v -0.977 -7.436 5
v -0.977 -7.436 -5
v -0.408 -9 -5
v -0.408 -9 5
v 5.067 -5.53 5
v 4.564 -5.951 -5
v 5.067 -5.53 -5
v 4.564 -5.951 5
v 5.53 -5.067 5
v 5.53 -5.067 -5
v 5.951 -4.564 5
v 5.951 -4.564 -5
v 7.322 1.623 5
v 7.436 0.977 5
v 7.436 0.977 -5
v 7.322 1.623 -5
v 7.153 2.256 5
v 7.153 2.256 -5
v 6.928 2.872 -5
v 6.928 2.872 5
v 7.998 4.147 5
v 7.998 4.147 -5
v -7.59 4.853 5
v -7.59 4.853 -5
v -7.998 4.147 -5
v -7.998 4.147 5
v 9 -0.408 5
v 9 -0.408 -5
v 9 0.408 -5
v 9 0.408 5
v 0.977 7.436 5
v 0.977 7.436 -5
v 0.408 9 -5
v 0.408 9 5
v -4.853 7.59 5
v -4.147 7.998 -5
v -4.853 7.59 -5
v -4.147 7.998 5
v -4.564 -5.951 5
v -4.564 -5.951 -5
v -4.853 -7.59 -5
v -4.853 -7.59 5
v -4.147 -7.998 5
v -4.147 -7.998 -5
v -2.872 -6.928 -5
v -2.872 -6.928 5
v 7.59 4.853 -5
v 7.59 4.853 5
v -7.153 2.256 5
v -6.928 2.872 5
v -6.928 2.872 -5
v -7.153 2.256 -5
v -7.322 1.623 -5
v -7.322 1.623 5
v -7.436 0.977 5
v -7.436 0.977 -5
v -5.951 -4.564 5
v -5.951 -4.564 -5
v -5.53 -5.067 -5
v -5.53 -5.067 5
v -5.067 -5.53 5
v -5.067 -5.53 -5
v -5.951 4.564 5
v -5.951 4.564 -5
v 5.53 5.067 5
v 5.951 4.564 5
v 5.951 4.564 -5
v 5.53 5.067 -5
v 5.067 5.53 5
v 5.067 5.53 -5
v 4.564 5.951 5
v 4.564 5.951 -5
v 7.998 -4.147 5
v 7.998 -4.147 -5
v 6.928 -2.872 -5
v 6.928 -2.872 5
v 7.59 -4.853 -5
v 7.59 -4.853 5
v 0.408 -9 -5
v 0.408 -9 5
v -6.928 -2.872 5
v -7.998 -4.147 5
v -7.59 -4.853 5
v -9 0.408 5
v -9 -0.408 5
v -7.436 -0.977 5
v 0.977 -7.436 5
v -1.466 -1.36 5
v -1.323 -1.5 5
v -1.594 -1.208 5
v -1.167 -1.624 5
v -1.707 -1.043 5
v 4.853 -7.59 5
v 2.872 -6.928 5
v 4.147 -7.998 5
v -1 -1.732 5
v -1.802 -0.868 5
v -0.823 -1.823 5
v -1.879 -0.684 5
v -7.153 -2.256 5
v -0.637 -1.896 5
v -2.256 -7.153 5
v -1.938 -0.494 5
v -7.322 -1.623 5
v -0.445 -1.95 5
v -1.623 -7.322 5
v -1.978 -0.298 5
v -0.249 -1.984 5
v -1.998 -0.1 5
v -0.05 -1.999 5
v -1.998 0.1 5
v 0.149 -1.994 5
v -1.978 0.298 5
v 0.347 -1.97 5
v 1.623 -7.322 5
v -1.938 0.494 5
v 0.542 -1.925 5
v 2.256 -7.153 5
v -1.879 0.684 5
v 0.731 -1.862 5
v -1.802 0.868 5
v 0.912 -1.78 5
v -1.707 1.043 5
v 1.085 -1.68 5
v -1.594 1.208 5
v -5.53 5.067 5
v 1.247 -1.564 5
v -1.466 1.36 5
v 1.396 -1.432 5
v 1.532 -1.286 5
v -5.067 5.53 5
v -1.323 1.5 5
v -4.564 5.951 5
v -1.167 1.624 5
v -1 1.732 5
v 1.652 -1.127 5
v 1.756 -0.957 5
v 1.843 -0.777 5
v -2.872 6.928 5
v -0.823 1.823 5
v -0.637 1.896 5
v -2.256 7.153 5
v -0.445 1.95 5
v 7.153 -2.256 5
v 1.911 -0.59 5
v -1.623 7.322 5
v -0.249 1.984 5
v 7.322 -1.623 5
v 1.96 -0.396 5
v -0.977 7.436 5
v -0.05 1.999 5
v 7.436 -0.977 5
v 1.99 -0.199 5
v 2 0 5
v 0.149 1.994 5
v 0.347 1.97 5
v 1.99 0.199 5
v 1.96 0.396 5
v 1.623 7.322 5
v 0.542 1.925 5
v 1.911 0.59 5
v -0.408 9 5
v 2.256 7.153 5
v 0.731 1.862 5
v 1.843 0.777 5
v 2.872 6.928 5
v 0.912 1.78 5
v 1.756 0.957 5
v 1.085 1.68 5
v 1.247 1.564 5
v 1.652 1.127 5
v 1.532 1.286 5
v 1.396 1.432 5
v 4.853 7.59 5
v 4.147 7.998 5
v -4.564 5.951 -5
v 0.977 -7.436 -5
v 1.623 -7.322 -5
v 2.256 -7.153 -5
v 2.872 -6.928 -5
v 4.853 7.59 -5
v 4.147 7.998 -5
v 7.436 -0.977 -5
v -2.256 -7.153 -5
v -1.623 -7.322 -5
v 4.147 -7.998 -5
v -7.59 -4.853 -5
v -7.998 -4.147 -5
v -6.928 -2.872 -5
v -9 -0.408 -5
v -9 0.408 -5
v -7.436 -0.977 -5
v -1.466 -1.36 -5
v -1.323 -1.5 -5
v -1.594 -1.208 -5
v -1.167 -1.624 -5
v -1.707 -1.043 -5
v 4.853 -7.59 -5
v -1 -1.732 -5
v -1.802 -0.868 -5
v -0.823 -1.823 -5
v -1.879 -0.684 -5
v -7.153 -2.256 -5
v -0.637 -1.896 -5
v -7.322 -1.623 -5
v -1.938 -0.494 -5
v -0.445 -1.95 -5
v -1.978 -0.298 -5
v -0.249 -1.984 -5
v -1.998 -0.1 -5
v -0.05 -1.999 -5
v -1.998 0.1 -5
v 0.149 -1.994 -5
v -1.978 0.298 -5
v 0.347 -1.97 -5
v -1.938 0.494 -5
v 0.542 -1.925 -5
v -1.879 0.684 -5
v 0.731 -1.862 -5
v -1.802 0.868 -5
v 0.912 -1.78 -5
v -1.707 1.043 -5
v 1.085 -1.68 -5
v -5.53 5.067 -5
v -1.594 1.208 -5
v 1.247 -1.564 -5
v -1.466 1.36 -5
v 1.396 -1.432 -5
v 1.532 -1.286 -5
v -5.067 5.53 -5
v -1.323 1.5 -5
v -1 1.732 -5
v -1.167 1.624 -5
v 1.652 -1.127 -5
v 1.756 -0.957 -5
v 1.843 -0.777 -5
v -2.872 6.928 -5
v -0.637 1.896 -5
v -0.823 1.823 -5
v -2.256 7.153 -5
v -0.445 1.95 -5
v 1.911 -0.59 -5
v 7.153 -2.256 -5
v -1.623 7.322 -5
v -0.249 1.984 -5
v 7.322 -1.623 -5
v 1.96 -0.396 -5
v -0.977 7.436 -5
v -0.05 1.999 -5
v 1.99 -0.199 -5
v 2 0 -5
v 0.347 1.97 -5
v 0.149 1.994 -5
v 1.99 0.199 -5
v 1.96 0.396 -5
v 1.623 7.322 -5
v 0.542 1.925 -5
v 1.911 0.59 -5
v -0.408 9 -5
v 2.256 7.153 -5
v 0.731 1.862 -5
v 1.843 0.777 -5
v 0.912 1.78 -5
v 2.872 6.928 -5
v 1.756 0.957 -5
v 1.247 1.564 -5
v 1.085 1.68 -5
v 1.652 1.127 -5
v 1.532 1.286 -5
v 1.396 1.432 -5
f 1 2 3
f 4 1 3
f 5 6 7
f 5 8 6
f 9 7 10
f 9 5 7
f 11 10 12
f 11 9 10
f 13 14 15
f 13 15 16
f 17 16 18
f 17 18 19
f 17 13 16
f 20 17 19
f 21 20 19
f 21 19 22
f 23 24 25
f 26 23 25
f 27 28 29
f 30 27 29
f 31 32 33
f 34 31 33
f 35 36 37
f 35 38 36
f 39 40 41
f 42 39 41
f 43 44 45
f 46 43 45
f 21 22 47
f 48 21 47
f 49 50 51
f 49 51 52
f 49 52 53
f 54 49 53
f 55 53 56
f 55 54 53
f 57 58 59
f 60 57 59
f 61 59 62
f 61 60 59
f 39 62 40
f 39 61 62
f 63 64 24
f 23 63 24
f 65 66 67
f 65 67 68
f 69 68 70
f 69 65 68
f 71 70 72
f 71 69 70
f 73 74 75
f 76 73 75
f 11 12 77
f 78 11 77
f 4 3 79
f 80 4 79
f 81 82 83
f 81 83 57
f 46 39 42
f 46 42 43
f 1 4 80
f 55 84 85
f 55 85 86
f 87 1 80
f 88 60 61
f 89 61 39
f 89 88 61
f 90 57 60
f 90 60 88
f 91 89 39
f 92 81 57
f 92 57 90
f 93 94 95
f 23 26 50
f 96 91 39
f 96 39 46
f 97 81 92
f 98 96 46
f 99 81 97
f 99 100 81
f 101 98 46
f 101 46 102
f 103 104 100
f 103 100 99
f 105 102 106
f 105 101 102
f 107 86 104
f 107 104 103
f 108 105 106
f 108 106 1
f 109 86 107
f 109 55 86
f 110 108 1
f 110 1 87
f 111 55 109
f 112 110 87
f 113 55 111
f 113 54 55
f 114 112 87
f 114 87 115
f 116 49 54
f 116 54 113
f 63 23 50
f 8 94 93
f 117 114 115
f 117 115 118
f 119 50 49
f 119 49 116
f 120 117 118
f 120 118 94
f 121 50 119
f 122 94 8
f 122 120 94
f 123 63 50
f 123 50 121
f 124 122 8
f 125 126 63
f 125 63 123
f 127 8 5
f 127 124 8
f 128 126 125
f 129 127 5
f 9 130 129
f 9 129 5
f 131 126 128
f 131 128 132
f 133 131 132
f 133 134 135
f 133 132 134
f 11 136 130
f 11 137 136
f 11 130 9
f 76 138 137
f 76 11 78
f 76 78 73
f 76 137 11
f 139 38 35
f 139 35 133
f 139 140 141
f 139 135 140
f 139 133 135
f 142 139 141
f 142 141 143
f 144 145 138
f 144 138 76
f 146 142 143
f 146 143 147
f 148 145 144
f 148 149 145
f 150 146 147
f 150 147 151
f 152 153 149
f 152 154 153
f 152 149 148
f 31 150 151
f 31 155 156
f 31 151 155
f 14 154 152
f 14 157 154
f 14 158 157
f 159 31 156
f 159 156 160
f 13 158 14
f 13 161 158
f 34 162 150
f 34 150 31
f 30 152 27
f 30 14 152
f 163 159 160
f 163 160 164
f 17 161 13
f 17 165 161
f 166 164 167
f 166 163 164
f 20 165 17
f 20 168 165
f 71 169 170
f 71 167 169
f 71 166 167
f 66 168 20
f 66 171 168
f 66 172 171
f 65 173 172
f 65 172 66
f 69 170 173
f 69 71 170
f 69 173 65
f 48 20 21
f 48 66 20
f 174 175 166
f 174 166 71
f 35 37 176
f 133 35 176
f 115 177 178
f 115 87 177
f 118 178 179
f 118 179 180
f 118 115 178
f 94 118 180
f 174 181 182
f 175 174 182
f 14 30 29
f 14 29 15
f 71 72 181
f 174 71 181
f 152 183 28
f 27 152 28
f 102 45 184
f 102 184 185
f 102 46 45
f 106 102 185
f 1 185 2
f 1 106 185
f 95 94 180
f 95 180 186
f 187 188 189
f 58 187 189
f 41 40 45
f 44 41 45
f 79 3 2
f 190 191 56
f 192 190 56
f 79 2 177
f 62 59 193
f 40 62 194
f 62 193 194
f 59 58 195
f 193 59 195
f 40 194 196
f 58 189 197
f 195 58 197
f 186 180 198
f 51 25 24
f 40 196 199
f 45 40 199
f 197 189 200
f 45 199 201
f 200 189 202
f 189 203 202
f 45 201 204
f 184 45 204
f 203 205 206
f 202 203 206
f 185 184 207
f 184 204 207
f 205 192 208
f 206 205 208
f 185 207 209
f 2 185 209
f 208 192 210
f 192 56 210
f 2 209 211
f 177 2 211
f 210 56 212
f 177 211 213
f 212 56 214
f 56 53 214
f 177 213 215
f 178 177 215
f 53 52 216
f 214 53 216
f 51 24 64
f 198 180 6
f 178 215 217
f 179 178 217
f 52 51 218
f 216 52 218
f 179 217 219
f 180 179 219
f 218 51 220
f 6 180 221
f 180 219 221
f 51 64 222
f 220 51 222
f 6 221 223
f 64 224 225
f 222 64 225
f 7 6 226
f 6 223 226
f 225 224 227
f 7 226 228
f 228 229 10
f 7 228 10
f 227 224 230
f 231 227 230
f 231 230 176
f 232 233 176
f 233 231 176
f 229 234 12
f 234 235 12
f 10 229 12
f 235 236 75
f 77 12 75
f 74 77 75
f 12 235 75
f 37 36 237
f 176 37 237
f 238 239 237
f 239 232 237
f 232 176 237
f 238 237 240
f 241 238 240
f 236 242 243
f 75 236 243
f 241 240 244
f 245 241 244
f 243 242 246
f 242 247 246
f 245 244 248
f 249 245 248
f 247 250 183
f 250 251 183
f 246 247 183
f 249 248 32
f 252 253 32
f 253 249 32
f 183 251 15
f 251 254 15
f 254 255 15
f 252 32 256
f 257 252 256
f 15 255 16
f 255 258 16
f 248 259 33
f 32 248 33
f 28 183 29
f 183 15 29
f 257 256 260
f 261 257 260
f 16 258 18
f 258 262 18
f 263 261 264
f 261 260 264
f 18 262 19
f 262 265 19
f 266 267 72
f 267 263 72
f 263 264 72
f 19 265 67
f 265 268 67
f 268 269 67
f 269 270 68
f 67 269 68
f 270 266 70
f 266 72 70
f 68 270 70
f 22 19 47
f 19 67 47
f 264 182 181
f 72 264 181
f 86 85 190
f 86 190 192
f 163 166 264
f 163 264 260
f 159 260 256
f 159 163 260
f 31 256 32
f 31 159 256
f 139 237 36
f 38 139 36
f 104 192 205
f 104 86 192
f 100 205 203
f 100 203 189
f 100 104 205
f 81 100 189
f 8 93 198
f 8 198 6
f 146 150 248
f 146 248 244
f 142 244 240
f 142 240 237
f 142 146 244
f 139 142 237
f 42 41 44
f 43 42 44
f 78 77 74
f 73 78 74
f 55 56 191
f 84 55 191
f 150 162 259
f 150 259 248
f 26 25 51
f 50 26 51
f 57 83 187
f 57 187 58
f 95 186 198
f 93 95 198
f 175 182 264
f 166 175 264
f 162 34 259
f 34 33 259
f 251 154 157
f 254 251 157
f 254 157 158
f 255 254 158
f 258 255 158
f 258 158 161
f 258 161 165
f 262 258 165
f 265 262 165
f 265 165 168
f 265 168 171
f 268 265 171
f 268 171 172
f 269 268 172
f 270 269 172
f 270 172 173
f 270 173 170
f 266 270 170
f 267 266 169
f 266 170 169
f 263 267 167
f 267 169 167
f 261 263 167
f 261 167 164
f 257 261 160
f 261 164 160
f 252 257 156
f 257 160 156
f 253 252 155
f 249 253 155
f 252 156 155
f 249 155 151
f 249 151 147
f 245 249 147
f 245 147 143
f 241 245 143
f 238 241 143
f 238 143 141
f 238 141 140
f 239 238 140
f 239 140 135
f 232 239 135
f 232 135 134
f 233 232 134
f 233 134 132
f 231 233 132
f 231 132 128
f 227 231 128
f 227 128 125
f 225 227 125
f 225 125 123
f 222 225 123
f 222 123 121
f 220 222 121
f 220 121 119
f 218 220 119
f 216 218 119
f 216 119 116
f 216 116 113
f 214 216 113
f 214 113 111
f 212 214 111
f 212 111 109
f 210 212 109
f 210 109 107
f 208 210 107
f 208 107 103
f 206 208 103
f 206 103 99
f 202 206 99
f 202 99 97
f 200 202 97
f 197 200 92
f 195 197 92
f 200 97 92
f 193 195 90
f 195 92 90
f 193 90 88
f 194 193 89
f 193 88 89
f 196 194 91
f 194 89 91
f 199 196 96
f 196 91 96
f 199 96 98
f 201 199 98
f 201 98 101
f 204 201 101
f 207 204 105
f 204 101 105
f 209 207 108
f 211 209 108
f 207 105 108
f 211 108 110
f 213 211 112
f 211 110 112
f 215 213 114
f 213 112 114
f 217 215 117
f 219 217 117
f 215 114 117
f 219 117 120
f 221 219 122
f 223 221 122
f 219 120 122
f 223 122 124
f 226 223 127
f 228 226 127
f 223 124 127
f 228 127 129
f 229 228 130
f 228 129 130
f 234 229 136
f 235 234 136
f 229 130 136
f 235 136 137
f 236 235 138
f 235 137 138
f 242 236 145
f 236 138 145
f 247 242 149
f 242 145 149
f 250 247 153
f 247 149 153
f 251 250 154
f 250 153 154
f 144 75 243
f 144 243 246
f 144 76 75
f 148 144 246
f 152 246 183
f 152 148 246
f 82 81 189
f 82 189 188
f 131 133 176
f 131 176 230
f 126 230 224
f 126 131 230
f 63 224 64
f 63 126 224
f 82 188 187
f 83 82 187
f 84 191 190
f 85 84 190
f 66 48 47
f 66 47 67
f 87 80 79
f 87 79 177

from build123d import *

# Parameters (mm, degrees)
IZIM1_R                     = 7.5
Y_KSEKLIK_EKSTR_ZYON1_DEPTH = 5
Y_KSEKLIK_EKSTR_ZYON2_DEPTH = 5
IZIM3_R                     = 2
KES_EKSTR_ZYON1_DEPTH       = 11


with BuildPart() as part:
    # Çizim1 → Yükseklik-Ekstrüzyon1 (new body, symmetric)
    with BuildSketch(Plane.XY):
        Circle(IZIM1_R)
    extrude(amount=Y_KSEKLIK_EKSTR_ZYON1_DEPTH, both=True)

    # Çizim2 → Yükseklik-Ekstrüzyon2 (add, symmetric)
    with BuildSketch(Plane.XY):
        Polygon((-1.5, 6), (1.5, 6), (0.408089297, 9), (-0.408089297, 9), align=None)
        Polygon((4.146584302, 7.998273283), (1.700961894, 5.946152423), (4.299038106, 4.446152423), (4.853415698, 7.590183985), align=None)
        Polygon((7.590183985, 4.853415698), (4.446152423, 4.299038106), (5.946152423, 1.700961894), (7.998273283, 4.146584302), align=None)
        Polygon((9, 0.408089297), (6, 1.5), (6, -1.5), (9, -0.408089297), align=None)
        Polygon((7.998273283, -4.146584302), (5.946152423, -1.700961894), (4.446152423, -4.299038106), (7.590183985, -4.853415698), align=None)
        Polygon((4.853415698, -7.590183985), (4.299038106, -4.446152423), (1.700961894, -5.946152423), (4.146584302, -7.998273283), align=None)
        Polygon((0.408089297, -9), (1.5, -6), (-1.5, -6), (-0.408089297, -9), align=None)
        Polygon((-4.146584302, -7.998273283), (-1.700961894, -5.946152423), (-4.299038106, -4.446152423), (-4.853415698, -7.590183985), align=None)
        Polygon((-7.590183985, -4.853415698), (-4.446152423, -4.299038106), (-5.946152423, -1.700961894), (-7.998273283, -4.146584302), align=None)
        Polygon((-9, -0.408089297), (-6, -1.5), (-6, 1.5), (-9, 0.408089297), align=None)
        Polygon((-7.998273283, 4.146584302), (-5.946152423, 1.700961894), (-4.446152423, 4.299038106), (-7.590183985, 4.853415698), align=None)
        Polygon((-4.853415698, 7.590183985), (-4.299038106, 4.446152423), (-1.700961894, 5.946152423), (-4.146584302, 7.998273283), align=None)
    extrude(amount=Y_KSEKLIK_EKSTR_ZYON2_DEPTH, both=True)

    # Çizim3 → Kes-Ekstrüzyon1 (cut, through all)
    with BuildSketch(Plane.XY.offset(5)):
        Circle(IZIM3_R)
    extrude(amount=-KES_EKSTR_ZYON1_DEPTH, mode=Mode.SUBTRACT)


solid = part.part
